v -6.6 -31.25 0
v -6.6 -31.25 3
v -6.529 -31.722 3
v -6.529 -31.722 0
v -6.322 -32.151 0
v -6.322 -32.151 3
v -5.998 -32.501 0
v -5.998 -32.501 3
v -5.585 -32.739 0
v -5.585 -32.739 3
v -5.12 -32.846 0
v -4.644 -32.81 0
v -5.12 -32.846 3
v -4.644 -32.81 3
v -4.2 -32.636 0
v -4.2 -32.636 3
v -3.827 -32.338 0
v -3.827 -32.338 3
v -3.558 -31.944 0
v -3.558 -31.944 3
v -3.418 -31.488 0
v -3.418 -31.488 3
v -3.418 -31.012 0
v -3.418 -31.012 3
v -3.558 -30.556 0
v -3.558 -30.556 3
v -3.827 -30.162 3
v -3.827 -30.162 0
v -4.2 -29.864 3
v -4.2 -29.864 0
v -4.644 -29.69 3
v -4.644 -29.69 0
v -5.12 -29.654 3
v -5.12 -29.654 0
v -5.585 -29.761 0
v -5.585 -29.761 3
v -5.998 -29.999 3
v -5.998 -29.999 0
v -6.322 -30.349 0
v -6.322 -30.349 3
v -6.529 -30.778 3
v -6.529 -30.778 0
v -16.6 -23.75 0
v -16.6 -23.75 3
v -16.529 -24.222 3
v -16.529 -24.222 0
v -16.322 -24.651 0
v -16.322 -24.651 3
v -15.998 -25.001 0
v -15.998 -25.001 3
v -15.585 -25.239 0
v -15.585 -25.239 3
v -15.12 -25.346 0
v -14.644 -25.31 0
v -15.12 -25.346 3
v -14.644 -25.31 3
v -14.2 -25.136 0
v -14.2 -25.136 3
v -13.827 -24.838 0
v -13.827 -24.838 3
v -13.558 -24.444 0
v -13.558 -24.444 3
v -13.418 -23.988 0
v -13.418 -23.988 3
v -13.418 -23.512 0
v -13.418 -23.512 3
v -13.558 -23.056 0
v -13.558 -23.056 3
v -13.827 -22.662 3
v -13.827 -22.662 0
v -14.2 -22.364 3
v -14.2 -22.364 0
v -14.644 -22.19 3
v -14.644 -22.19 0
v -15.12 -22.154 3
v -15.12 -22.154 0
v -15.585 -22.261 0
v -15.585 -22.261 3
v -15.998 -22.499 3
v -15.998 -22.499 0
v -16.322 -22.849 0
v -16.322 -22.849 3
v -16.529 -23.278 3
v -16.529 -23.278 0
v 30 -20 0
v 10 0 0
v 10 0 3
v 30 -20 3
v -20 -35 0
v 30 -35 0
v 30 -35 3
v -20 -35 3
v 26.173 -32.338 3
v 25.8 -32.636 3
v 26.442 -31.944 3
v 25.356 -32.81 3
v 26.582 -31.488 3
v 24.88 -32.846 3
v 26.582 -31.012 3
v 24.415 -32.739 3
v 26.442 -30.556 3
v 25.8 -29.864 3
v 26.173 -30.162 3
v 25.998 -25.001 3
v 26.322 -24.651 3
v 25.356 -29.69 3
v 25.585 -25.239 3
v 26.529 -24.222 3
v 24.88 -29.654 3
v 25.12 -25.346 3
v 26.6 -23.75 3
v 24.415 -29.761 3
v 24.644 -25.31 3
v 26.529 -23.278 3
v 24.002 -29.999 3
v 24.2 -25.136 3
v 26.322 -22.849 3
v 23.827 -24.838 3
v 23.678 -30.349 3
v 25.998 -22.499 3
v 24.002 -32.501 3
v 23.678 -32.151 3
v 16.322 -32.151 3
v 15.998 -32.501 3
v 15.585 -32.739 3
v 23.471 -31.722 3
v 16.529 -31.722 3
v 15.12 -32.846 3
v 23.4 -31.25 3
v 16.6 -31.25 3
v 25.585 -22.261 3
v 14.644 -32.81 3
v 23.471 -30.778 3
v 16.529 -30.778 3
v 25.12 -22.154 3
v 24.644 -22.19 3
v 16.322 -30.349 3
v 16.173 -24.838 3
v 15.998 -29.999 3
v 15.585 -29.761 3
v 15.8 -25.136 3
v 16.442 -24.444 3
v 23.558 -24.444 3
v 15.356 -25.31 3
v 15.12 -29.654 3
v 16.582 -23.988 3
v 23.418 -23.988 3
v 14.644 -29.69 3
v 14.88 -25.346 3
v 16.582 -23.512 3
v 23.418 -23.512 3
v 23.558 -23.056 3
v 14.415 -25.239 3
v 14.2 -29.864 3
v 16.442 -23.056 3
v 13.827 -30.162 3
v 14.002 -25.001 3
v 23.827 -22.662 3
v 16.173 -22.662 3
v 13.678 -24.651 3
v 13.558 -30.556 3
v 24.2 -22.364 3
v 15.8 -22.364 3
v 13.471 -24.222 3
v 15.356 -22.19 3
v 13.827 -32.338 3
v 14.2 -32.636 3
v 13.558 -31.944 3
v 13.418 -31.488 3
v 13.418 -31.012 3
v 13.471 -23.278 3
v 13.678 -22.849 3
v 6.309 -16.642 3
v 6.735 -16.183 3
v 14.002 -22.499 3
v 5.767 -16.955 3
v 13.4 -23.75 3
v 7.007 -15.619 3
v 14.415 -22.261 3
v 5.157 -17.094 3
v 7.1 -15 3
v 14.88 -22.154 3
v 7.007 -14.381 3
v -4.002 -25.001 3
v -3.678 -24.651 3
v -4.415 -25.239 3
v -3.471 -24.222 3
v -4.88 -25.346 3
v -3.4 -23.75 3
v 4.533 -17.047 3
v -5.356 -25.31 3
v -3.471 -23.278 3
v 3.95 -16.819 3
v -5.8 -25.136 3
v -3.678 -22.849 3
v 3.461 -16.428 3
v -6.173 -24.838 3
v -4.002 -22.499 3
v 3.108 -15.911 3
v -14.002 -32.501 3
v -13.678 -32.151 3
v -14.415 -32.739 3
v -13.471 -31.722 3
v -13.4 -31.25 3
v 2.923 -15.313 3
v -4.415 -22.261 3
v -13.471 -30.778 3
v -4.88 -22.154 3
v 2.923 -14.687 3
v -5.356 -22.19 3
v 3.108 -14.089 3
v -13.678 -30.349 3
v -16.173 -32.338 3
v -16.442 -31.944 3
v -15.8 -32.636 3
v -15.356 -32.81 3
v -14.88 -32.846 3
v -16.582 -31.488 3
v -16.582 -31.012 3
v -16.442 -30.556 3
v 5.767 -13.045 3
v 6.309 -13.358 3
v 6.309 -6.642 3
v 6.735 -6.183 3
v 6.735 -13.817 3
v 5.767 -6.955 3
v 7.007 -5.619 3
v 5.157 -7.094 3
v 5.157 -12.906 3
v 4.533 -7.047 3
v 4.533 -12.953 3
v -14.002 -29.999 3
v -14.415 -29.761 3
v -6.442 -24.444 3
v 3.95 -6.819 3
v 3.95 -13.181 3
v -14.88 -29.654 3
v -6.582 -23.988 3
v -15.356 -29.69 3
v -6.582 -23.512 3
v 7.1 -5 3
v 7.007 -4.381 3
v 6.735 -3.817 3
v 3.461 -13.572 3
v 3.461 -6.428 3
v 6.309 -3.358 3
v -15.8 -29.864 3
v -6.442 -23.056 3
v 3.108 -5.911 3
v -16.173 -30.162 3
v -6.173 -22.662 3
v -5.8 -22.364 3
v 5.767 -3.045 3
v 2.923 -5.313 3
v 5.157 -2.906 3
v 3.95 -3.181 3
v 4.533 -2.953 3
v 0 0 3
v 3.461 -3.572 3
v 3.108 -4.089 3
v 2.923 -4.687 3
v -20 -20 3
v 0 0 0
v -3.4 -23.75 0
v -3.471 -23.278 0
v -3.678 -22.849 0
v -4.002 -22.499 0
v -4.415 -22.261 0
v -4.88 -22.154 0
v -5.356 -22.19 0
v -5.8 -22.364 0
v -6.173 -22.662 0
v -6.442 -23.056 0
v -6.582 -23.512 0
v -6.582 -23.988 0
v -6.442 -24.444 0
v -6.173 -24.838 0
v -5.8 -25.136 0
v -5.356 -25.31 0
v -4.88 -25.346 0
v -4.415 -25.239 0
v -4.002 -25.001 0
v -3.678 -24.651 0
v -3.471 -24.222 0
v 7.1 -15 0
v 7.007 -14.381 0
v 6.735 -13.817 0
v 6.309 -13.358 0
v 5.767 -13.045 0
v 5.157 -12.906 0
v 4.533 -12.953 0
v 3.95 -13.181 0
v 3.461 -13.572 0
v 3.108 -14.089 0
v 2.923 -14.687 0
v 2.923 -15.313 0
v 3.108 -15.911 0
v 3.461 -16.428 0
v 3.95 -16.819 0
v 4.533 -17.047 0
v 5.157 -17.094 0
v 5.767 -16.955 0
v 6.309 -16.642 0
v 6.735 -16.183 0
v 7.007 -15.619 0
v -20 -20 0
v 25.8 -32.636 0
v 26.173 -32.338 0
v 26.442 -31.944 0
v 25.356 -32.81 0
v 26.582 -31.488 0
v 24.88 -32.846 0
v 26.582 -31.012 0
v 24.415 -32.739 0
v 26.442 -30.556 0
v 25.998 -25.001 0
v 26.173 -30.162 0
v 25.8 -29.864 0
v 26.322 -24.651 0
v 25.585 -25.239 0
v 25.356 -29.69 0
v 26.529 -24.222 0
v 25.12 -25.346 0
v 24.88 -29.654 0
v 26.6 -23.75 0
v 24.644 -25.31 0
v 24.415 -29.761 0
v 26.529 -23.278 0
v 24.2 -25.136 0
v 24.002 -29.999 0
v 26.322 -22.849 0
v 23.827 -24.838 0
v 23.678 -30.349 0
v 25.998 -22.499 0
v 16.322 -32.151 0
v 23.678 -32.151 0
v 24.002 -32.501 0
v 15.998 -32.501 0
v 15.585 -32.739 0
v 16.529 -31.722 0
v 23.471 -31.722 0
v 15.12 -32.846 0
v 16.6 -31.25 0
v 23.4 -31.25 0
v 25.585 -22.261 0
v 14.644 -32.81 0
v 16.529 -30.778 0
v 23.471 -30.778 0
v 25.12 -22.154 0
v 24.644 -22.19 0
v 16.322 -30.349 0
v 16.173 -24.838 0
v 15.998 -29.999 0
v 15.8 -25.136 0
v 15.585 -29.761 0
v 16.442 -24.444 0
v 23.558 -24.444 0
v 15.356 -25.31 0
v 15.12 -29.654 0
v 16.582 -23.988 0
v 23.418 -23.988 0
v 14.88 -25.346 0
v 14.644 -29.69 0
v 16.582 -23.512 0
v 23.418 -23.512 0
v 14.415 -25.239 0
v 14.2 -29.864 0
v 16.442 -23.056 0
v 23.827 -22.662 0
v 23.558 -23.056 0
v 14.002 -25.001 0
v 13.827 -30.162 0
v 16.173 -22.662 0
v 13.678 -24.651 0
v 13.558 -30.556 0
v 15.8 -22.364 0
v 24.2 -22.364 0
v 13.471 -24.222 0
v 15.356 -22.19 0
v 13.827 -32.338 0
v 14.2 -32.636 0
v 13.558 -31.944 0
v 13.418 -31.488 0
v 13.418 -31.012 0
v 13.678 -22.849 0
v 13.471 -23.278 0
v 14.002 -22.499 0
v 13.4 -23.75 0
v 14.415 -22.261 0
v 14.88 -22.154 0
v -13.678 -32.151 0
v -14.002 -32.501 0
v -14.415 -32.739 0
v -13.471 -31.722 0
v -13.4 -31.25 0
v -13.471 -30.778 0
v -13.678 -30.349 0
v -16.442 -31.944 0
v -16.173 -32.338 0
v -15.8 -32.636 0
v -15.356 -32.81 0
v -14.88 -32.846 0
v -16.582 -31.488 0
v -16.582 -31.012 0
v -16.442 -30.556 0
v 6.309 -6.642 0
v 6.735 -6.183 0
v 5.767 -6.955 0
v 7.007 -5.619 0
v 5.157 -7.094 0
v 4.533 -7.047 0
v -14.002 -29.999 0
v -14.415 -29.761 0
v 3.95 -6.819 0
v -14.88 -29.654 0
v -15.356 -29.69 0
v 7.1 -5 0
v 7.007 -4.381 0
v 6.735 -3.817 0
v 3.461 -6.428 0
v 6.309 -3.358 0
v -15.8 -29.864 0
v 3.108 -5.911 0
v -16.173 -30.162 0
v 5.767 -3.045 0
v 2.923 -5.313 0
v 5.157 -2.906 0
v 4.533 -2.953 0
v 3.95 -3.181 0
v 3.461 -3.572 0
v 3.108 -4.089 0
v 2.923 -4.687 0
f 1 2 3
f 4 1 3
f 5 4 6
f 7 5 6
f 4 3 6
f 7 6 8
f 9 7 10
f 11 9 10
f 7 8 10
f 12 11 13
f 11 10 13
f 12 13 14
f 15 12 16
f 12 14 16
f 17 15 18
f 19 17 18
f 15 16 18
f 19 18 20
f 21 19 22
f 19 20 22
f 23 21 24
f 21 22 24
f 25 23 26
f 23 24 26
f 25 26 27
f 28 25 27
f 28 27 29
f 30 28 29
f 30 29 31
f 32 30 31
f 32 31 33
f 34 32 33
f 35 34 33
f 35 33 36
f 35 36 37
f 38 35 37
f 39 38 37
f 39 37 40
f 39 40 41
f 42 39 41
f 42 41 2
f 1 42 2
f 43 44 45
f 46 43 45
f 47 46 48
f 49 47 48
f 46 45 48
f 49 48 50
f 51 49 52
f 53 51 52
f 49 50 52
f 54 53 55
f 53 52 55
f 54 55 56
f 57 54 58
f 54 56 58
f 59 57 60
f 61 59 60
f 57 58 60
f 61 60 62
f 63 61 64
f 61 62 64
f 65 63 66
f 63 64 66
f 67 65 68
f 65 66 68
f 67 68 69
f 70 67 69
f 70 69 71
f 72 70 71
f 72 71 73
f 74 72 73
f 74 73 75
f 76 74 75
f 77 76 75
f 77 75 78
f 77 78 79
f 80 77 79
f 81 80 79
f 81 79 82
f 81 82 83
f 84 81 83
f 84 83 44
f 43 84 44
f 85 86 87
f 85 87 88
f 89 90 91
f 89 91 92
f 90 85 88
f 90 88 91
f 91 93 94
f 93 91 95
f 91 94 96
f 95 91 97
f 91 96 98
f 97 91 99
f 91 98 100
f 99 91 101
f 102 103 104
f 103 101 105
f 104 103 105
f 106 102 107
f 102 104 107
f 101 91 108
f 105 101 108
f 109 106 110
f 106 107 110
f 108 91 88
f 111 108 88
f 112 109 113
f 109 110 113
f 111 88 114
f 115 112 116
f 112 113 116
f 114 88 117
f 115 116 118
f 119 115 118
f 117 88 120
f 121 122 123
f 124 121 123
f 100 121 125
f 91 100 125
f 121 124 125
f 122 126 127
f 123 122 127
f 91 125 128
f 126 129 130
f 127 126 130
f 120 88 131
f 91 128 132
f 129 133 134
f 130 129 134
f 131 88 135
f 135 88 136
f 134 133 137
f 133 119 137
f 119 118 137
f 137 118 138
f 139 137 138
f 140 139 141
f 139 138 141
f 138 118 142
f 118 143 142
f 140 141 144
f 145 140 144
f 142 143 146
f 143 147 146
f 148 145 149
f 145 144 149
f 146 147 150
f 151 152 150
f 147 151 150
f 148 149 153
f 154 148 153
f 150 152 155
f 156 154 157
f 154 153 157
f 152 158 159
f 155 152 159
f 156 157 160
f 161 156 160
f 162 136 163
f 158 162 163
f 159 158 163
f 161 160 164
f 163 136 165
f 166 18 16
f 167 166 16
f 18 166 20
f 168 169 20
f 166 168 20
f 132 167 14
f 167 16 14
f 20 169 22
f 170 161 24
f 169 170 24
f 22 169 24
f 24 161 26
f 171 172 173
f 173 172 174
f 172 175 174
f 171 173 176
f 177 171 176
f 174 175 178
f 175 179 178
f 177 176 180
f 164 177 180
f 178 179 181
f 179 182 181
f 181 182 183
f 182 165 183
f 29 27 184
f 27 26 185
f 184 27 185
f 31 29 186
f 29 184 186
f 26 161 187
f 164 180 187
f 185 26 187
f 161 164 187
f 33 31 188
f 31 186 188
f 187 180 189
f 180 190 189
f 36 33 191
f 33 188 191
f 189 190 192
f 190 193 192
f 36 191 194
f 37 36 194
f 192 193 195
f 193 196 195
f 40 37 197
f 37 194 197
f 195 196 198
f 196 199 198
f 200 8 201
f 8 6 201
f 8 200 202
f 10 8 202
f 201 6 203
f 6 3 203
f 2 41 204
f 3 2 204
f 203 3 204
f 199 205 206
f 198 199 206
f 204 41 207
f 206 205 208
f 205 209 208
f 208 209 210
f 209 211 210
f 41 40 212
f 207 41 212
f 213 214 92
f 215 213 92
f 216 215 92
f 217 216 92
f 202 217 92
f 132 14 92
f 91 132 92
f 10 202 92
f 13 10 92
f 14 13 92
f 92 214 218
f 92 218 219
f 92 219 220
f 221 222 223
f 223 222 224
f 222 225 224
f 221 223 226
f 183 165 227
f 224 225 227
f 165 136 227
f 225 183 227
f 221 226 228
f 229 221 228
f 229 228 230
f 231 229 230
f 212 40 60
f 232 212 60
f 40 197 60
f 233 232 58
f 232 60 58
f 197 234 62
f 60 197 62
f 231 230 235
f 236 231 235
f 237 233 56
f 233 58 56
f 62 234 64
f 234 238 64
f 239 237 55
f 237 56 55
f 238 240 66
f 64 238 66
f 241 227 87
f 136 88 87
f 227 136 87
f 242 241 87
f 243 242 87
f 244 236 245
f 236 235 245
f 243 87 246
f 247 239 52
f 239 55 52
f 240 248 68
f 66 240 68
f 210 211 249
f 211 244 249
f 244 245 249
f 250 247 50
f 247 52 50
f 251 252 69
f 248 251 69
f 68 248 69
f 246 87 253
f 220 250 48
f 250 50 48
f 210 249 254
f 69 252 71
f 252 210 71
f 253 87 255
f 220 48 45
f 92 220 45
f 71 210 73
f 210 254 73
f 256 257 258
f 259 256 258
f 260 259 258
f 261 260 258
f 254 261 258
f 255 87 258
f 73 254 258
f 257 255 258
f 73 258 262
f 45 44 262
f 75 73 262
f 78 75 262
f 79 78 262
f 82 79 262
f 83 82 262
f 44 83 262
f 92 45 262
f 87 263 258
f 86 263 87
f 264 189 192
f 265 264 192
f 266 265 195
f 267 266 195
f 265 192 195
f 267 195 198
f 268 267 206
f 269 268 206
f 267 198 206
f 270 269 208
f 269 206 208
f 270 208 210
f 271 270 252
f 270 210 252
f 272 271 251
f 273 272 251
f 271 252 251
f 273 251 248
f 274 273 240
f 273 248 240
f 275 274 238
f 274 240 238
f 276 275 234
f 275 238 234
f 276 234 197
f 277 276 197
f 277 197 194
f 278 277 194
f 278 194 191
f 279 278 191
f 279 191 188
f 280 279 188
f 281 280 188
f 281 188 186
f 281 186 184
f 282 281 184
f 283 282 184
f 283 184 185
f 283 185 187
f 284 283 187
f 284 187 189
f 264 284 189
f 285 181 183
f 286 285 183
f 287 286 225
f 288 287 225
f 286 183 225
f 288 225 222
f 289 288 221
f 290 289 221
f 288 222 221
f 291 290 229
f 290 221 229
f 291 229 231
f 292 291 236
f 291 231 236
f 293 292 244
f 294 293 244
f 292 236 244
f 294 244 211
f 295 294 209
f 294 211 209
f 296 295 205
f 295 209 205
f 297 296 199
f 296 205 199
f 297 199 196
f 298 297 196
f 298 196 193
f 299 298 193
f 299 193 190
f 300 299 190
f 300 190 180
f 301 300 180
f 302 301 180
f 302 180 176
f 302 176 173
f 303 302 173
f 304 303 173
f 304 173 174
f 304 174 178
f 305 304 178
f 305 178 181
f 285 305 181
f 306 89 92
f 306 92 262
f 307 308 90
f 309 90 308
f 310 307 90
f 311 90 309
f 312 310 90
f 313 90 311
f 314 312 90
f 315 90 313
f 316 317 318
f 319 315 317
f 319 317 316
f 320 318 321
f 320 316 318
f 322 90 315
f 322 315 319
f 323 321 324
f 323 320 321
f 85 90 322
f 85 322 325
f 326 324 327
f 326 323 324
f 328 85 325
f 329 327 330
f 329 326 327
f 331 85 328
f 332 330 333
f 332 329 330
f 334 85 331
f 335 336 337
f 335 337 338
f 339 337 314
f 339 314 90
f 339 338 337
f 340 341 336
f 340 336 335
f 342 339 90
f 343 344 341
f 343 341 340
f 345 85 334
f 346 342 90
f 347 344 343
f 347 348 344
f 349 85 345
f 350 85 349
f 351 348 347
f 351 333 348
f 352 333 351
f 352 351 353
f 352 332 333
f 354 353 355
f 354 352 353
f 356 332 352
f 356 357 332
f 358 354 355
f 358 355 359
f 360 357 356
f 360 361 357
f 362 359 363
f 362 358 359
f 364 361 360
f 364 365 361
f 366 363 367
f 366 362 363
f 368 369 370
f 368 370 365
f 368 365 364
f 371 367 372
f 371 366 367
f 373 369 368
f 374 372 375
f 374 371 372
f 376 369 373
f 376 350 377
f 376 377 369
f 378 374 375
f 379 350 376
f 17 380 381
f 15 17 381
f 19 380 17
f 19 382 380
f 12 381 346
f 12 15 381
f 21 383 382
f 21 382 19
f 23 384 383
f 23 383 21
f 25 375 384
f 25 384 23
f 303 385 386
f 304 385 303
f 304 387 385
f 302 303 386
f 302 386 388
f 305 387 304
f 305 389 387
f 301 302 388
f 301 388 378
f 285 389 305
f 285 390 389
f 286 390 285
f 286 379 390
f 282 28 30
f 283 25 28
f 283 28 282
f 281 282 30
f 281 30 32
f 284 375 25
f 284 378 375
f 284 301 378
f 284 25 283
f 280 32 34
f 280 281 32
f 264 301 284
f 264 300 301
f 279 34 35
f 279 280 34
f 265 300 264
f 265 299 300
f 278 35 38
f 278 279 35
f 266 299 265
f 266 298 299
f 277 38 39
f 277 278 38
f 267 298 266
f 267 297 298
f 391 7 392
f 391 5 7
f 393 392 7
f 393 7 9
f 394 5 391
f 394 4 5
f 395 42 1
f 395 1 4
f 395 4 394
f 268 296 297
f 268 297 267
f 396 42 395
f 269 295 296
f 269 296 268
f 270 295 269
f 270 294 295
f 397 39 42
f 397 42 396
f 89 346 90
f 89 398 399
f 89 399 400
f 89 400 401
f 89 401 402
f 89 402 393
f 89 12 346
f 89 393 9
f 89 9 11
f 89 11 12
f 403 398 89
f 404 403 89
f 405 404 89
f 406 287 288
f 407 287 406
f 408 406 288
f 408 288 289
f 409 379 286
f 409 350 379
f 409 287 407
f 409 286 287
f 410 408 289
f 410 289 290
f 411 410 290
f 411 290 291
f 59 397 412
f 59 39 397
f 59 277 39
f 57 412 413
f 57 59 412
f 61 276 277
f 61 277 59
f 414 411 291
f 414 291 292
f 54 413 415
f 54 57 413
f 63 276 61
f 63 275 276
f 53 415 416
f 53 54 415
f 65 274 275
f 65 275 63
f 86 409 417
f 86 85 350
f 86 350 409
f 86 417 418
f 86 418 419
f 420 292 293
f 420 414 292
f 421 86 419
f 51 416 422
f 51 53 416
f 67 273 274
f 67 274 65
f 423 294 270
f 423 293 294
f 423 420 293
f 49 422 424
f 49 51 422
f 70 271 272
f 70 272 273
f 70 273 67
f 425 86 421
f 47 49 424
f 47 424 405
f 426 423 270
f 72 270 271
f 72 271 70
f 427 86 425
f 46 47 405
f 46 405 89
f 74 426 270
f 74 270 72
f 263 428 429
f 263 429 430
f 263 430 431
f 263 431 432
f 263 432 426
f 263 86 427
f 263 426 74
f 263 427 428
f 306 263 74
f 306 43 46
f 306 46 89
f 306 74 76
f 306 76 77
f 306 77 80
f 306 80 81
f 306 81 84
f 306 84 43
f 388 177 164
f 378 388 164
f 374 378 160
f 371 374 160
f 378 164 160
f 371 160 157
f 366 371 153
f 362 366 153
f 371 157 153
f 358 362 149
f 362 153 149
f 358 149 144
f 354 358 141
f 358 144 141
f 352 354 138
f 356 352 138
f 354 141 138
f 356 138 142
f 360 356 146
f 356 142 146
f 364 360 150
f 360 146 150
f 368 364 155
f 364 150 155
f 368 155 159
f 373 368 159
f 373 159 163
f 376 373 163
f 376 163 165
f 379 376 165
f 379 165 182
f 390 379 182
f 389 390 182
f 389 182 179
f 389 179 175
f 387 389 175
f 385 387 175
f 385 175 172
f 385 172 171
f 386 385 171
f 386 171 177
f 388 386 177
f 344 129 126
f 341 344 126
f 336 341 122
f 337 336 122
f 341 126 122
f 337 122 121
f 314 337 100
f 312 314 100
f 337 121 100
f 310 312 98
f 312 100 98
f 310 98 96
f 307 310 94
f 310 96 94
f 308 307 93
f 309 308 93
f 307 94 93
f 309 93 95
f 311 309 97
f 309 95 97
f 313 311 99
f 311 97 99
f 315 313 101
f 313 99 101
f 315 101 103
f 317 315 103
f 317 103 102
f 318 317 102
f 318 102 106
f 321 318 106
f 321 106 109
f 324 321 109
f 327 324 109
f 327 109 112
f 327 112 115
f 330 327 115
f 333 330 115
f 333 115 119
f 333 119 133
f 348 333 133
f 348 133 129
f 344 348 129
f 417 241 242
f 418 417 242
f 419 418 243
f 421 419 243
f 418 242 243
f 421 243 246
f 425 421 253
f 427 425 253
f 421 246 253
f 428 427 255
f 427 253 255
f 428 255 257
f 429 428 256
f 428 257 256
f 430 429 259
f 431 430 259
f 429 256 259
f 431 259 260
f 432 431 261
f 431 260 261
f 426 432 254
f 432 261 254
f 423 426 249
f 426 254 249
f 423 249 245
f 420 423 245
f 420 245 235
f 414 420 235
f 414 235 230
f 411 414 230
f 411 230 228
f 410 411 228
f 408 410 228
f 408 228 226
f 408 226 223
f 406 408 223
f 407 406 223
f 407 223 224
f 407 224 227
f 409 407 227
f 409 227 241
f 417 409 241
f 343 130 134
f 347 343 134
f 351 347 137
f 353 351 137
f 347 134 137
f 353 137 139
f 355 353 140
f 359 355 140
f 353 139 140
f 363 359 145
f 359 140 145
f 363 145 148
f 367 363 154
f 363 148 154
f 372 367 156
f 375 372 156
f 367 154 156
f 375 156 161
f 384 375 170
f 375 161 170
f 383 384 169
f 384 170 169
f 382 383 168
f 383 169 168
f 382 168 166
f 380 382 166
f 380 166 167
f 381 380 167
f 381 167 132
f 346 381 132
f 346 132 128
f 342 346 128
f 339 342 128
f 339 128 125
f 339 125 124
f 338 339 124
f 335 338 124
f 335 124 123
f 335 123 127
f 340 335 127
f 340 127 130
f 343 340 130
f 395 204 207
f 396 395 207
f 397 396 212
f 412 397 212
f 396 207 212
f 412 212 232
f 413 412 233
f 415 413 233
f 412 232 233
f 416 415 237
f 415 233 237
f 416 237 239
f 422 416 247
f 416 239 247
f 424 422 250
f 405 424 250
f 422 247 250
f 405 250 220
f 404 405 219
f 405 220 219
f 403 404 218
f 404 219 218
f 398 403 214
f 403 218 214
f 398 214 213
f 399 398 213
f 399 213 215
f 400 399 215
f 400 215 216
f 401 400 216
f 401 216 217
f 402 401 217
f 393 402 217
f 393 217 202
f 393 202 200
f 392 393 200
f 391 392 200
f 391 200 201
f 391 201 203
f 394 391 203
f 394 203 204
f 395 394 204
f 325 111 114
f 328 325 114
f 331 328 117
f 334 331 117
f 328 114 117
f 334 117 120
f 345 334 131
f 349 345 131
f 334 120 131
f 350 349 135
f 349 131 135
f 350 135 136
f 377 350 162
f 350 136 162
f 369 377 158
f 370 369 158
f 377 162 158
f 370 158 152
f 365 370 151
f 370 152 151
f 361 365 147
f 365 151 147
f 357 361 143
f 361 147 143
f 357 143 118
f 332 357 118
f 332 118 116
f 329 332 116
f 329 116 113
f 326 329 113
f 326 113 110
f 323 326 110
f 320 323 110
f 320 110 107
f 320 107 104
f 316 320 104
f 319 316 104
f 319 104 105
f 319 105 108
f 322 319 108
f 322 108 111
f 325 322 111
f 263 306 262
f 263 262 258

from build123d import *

# Parameters (mm, degrees)
EXTRUDE_1_DEPTH     = 3
SKETCH_2_R          = 1.6
SKETCH_2_R_2        = 2.1
CUT_EXTRUDE_1_DEPTH = 47.19523785


with BuildPart() as part:
    # 草图1 → 凸台-拉伸1 (new body)
    with BuildSketch(Plane.XY):
        Polygon((0, 0), (10, 0), (30, -20), (30, -35), (-20, -35), (-20, -20), align=None)
    extrude(amount=EXTRUDE_1_DEPTH)

    # 草图2 → 切除-拉伸1 (cut, through all)
    with BuildSketch(Plane.XY.offset(3)):
        with Locations((-15, -31.25)):
            Circle(SKETCH_2_R)
        with Locations(Location((-5, -31.25, 0), (0, 0, 180))):
            Circle(SKETCH_2_R)
        with Locations((-5, -23.75)):
            Circle(SKETCH_2_R)
        with Locations(Location((-15, -23.75, 0), (0, 0, 180))):
            Circle(SKETCH_2_R)
        with Locations((25, -23.75)):
            Circle(SKETCH_2_R)
        with Locations(Location((15, -23.75, 0), (0, 0, 180))):
            Circle(SKETCH_2_R)
        with Locations((15, -31.25)):
            Circle(SKETCH_2_R)
        with Locations(Location((25, -31.25, 0), (0, 0, 180))):
            Circle(SKETCH_2_R)
        with Locations((5, -5)):
            Circle(SKETCH_2_R_2)
        with Locations((5, -15)):
            Circle(SKETCH_2_R_2)
    extrude(amount=-CUT_EXTRUDE_1_DEPTH, mode=Mode.SUBTRACT)


solid = part.part
